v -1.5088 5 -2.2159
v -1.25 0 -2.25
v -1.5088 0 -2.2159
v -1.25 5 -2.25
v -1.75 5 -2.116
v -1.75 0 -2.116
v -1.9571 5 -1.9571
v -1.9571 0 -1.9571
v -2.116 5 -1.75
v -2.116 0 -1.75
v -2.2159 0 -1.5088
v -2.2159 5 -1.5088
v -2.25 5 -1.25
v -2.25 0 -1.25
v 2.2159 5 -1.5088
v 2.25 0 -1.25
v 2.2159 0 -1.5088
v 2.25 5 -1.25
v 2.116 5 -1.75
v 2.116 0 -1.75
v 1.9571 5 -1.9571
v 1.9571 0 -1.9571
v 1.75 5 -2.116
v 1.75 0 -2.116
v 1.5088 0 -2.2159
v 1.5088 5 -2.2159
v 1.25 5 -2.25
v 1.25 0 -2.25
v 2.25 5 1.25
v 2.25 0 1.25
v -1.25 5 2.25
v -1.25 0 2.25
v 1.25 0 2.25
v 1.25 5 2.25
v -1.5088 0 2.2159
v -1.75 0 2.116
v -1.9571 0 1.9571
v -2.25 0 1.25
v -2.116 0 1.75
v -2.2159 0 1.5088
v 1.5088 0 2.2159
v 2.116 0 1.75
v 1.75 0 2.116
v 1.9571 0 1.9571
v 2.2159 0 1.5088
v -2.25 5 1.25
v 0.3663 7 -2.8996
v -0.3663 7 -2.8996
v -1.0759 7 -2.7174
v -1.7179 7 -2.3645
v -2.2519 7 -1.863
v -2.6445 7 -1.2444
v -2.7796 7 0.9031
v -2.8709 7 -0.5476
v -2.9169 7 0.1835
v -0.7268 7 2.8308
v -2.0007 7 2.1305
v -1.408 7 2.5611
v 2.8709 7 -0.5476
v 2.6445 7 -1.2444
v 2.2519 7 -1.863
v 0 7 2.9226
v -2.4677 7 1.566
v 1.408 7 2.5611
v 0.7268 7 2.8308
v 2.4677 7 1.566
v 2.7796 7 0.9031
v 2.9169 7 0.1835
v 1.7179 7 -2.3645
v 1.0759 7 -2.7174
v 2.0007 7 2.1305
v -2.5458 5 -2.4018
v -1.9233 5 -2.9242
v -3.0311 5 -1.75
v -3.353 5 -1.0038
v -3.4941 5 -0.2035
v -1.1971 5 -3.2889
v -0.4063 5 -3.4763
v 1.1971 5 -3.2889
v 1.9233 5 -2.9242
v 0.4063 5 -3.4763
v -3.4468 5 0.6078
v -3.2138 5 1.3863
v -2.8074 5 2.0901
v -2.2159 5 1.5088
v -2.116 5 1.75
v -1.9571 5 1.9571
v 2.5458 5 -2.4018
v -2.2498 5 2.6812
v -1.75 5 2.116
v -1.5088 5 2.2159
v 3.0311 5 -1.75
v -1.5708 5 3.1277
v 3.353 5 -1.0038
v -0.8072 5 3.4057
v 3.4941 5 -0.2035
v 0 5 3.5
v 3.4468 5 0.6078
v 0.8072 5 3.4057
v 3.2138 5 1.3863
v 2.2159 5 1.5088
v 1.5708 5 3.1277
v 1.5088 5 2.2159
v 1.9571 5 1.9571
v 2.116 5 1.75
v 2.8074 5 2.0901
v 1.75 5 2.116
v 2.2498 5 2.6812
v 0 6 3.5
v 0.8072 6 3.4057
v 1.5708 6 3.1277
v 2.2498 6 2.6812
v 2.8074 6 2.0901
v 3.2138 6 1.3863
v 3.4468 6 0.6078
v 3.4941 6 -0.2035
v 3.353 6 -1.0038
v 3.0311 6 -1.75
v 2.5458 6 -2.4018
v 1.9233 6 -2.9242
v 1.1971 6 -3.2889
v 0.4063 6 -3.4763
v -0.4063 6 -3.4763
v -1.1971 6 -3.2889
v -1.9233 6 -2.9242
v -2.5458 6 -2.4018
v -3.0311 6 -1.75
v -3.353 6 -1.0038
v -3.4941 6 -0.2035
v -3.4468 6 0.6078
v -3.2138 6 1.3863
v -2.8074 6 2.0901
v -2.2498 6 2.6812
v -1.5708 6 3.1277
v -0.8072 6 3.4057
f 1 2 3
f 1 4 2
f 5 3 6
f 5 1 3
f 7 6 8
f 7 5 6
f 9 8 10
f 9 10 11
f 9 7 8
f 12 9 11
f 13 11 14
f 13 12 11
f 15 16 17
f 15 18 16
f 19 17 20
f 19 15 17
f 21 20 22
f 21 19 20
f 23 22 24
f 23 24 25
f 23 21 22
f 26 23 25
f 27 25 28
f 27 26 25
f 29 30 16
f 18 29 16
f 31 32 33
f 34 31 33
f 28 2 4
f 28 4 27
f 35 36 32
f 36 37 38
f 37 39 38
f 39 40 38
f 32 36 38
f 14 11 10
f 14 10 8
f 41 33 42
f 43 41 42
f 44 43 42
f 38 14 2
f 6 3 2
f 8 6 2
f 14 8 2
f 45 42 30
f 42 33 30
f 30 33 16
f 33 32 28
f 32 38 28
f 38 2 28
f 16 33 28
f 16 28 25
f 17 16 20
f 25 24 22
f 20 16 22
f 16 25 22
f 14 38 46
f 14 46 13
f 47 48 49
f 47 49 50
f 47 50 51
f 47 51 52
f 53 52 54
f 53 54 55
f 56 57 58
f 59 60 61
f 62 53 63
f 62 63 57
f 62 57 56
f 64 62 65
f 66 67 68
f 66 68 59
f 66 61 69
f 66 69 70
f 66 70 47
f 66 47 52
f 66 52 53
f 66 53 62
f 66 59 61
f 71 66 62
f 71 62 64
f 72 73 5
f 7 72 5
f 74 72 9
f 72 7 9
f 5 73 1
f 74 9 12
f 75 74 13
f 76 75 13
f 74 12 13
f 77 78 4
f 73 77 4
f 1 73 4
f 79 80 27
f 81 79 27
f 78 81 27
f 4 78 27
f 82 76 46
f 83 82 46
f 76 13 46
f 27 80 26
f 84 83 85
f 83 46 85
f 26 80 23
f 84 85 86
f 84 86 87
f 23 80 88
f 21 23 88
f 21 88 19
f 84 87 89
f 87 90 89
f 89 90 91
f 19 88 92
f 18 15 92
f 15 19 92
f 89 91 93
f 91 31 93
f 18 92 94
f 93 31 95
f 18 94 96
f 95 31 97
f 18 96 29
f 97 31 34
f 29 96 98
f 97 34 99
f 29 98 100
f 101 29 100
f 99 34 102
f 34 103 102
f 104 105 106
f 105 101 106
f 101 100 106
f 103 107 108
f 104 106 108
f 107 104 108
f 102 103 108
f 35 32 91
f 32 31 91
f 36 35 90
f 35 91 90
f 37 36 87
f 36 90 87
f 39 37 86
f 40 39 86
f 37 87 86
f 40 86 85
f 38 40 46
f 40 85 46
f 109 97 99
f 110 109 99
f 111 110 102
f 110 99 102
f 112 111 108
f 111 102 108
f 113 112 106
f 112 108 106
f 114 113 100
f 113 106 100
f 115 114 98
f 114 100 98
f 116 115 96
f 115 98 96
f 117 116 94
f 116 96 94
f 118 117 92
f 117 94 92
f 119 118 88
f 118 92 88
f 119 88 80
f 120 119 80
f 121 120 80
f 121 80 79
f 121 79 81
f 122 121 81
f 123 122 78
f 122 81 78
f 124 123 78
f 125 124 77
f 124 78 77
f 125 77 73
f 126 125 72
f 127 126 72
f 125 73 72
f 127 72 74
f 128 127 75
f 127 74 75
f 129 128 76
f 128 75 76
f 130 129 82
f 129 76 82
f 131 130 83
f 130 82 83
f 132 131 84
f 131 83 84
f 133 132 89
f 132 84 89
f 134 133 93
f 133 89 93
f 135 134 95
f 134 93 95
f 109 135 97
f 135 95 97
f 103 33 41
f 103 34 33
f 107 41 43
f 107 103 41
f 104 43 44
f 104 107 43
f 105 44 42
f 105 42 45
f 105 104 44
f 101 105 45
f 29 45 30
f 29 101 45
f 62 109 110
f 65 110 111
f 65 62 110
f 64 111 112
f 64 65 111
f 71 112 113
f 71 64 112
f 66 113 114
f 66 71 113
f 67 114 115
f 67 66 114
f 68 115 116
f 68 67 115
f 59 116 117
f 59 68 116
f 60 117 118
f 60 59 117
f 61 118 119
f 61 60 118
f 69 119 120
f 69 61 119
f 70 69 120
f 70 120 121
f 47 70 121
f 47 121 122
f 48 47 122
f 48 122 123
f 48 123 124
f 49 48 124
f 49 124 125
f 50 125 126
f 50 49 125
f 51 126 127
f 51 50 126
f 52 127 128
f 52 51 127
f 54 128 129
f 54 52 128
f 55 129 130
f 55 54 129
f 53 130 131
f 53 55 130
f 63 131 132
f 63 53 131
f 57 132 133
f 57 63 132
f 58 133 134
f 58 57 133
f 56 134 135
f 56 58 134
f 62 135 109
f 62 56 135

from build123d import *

# Parameters (mm, degrees)
SKETCH_2_W      = 4.5
SKETCH_2_H      = 4.5
EXTRUDE_1_DEPTH = 5
SKETCH_3_R      = 3.5
EXTRUDE_2_DEPTH = 2
CHAMFER_1_SIZE  = 1
CHAMFER_1_SIZE2 = 0.577350269
FILLET_1_R      = 1


with BuildPart() as part:
    # Эскиз2 → Бобышка-Вытянуть1 (new body)
    with BuildSketch(Plane(origin=(0, 0, 0), x_dir=(1, 0, 0), z_dir=(0, 1, 0))):
        Rectangle(SKETCH_2_W, SKETCH_2_H)
    extrude(amount=EXTRUDE_1_DEPTH)

    # Эскиз3 → Бобышка-Вытянуть2 (add)
    with BuildSketch(Plane(origin=(0, 5, 0), x_dir=(1, 0, 0), z_dir=(0, 1, 0))):
        with Locations(Location((0, 0, 0), (0, 0, 270))):
            Circle(SKETCH_3_R)
    extrude(amount=EXTRUDE_2_DEPTH)

    # Фаска1
    chamfer_1_edges = [part.edges().sort_by_distance(p)[0] for p in [
        (0, 7, -3.5),
    ]]
    chamfer_1_side = [part.faces().sort_by_distance(p)[0] for p in [
        (0, 6, -3.5),
    ]]
    chamfer(chamfer_1_edges, length=CHAMFER_1_SIZE, length2=CHAMFER_1_SIZE2, reference=chamfer_1_side[0])

    # Скругление1
    fillet_1_edges = [part.edges().sort_by_distance(p)[0] for p in [
        (2.25, 2.5, 2.25),
        (-2.25, 2.5, 2.25),
        (-2.25, 2.5, -2.25),
        (2.25, 2.5, -2.25),
    ]]
    fillet(fillet_1_edges, radius=FILLET_1_R)


solid = part.part
